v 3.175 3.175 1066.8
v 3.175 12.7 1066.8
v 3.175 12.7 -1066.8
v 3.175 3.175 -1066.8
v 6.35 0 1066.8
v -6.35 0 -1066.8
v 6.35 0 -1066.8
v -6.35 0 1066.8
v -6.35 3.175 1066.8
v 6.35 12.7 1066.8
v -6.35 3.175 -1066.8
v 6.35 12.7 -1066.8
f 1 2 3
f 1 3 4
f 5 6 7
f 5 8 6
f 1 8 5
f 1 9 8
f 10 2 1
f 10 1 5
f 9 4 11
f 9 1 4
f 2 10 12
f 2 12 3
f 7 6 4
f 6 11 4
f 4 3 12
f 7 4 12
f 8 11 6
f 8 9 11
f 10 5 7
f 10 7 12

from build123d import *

# Parameters (mm, degrees)
BOSS_EXTRUDE1_DEPTH = 1066.8


with BuildPart() as part:
    # Sketch2 → Boss-Extrude1 (new body, symmetric)
    with BuildSketch(Plane.XY):
        Polygon((-6.35, 0), (6.35, 0), (6.35, 12.7), (3.175, 12.7), (3.175, 3.175), (-6.35, 3.175), align=None)
    extrude(amount=BOSS_EXTRUDE1_DEPTH, both=True)


solid = part.part
